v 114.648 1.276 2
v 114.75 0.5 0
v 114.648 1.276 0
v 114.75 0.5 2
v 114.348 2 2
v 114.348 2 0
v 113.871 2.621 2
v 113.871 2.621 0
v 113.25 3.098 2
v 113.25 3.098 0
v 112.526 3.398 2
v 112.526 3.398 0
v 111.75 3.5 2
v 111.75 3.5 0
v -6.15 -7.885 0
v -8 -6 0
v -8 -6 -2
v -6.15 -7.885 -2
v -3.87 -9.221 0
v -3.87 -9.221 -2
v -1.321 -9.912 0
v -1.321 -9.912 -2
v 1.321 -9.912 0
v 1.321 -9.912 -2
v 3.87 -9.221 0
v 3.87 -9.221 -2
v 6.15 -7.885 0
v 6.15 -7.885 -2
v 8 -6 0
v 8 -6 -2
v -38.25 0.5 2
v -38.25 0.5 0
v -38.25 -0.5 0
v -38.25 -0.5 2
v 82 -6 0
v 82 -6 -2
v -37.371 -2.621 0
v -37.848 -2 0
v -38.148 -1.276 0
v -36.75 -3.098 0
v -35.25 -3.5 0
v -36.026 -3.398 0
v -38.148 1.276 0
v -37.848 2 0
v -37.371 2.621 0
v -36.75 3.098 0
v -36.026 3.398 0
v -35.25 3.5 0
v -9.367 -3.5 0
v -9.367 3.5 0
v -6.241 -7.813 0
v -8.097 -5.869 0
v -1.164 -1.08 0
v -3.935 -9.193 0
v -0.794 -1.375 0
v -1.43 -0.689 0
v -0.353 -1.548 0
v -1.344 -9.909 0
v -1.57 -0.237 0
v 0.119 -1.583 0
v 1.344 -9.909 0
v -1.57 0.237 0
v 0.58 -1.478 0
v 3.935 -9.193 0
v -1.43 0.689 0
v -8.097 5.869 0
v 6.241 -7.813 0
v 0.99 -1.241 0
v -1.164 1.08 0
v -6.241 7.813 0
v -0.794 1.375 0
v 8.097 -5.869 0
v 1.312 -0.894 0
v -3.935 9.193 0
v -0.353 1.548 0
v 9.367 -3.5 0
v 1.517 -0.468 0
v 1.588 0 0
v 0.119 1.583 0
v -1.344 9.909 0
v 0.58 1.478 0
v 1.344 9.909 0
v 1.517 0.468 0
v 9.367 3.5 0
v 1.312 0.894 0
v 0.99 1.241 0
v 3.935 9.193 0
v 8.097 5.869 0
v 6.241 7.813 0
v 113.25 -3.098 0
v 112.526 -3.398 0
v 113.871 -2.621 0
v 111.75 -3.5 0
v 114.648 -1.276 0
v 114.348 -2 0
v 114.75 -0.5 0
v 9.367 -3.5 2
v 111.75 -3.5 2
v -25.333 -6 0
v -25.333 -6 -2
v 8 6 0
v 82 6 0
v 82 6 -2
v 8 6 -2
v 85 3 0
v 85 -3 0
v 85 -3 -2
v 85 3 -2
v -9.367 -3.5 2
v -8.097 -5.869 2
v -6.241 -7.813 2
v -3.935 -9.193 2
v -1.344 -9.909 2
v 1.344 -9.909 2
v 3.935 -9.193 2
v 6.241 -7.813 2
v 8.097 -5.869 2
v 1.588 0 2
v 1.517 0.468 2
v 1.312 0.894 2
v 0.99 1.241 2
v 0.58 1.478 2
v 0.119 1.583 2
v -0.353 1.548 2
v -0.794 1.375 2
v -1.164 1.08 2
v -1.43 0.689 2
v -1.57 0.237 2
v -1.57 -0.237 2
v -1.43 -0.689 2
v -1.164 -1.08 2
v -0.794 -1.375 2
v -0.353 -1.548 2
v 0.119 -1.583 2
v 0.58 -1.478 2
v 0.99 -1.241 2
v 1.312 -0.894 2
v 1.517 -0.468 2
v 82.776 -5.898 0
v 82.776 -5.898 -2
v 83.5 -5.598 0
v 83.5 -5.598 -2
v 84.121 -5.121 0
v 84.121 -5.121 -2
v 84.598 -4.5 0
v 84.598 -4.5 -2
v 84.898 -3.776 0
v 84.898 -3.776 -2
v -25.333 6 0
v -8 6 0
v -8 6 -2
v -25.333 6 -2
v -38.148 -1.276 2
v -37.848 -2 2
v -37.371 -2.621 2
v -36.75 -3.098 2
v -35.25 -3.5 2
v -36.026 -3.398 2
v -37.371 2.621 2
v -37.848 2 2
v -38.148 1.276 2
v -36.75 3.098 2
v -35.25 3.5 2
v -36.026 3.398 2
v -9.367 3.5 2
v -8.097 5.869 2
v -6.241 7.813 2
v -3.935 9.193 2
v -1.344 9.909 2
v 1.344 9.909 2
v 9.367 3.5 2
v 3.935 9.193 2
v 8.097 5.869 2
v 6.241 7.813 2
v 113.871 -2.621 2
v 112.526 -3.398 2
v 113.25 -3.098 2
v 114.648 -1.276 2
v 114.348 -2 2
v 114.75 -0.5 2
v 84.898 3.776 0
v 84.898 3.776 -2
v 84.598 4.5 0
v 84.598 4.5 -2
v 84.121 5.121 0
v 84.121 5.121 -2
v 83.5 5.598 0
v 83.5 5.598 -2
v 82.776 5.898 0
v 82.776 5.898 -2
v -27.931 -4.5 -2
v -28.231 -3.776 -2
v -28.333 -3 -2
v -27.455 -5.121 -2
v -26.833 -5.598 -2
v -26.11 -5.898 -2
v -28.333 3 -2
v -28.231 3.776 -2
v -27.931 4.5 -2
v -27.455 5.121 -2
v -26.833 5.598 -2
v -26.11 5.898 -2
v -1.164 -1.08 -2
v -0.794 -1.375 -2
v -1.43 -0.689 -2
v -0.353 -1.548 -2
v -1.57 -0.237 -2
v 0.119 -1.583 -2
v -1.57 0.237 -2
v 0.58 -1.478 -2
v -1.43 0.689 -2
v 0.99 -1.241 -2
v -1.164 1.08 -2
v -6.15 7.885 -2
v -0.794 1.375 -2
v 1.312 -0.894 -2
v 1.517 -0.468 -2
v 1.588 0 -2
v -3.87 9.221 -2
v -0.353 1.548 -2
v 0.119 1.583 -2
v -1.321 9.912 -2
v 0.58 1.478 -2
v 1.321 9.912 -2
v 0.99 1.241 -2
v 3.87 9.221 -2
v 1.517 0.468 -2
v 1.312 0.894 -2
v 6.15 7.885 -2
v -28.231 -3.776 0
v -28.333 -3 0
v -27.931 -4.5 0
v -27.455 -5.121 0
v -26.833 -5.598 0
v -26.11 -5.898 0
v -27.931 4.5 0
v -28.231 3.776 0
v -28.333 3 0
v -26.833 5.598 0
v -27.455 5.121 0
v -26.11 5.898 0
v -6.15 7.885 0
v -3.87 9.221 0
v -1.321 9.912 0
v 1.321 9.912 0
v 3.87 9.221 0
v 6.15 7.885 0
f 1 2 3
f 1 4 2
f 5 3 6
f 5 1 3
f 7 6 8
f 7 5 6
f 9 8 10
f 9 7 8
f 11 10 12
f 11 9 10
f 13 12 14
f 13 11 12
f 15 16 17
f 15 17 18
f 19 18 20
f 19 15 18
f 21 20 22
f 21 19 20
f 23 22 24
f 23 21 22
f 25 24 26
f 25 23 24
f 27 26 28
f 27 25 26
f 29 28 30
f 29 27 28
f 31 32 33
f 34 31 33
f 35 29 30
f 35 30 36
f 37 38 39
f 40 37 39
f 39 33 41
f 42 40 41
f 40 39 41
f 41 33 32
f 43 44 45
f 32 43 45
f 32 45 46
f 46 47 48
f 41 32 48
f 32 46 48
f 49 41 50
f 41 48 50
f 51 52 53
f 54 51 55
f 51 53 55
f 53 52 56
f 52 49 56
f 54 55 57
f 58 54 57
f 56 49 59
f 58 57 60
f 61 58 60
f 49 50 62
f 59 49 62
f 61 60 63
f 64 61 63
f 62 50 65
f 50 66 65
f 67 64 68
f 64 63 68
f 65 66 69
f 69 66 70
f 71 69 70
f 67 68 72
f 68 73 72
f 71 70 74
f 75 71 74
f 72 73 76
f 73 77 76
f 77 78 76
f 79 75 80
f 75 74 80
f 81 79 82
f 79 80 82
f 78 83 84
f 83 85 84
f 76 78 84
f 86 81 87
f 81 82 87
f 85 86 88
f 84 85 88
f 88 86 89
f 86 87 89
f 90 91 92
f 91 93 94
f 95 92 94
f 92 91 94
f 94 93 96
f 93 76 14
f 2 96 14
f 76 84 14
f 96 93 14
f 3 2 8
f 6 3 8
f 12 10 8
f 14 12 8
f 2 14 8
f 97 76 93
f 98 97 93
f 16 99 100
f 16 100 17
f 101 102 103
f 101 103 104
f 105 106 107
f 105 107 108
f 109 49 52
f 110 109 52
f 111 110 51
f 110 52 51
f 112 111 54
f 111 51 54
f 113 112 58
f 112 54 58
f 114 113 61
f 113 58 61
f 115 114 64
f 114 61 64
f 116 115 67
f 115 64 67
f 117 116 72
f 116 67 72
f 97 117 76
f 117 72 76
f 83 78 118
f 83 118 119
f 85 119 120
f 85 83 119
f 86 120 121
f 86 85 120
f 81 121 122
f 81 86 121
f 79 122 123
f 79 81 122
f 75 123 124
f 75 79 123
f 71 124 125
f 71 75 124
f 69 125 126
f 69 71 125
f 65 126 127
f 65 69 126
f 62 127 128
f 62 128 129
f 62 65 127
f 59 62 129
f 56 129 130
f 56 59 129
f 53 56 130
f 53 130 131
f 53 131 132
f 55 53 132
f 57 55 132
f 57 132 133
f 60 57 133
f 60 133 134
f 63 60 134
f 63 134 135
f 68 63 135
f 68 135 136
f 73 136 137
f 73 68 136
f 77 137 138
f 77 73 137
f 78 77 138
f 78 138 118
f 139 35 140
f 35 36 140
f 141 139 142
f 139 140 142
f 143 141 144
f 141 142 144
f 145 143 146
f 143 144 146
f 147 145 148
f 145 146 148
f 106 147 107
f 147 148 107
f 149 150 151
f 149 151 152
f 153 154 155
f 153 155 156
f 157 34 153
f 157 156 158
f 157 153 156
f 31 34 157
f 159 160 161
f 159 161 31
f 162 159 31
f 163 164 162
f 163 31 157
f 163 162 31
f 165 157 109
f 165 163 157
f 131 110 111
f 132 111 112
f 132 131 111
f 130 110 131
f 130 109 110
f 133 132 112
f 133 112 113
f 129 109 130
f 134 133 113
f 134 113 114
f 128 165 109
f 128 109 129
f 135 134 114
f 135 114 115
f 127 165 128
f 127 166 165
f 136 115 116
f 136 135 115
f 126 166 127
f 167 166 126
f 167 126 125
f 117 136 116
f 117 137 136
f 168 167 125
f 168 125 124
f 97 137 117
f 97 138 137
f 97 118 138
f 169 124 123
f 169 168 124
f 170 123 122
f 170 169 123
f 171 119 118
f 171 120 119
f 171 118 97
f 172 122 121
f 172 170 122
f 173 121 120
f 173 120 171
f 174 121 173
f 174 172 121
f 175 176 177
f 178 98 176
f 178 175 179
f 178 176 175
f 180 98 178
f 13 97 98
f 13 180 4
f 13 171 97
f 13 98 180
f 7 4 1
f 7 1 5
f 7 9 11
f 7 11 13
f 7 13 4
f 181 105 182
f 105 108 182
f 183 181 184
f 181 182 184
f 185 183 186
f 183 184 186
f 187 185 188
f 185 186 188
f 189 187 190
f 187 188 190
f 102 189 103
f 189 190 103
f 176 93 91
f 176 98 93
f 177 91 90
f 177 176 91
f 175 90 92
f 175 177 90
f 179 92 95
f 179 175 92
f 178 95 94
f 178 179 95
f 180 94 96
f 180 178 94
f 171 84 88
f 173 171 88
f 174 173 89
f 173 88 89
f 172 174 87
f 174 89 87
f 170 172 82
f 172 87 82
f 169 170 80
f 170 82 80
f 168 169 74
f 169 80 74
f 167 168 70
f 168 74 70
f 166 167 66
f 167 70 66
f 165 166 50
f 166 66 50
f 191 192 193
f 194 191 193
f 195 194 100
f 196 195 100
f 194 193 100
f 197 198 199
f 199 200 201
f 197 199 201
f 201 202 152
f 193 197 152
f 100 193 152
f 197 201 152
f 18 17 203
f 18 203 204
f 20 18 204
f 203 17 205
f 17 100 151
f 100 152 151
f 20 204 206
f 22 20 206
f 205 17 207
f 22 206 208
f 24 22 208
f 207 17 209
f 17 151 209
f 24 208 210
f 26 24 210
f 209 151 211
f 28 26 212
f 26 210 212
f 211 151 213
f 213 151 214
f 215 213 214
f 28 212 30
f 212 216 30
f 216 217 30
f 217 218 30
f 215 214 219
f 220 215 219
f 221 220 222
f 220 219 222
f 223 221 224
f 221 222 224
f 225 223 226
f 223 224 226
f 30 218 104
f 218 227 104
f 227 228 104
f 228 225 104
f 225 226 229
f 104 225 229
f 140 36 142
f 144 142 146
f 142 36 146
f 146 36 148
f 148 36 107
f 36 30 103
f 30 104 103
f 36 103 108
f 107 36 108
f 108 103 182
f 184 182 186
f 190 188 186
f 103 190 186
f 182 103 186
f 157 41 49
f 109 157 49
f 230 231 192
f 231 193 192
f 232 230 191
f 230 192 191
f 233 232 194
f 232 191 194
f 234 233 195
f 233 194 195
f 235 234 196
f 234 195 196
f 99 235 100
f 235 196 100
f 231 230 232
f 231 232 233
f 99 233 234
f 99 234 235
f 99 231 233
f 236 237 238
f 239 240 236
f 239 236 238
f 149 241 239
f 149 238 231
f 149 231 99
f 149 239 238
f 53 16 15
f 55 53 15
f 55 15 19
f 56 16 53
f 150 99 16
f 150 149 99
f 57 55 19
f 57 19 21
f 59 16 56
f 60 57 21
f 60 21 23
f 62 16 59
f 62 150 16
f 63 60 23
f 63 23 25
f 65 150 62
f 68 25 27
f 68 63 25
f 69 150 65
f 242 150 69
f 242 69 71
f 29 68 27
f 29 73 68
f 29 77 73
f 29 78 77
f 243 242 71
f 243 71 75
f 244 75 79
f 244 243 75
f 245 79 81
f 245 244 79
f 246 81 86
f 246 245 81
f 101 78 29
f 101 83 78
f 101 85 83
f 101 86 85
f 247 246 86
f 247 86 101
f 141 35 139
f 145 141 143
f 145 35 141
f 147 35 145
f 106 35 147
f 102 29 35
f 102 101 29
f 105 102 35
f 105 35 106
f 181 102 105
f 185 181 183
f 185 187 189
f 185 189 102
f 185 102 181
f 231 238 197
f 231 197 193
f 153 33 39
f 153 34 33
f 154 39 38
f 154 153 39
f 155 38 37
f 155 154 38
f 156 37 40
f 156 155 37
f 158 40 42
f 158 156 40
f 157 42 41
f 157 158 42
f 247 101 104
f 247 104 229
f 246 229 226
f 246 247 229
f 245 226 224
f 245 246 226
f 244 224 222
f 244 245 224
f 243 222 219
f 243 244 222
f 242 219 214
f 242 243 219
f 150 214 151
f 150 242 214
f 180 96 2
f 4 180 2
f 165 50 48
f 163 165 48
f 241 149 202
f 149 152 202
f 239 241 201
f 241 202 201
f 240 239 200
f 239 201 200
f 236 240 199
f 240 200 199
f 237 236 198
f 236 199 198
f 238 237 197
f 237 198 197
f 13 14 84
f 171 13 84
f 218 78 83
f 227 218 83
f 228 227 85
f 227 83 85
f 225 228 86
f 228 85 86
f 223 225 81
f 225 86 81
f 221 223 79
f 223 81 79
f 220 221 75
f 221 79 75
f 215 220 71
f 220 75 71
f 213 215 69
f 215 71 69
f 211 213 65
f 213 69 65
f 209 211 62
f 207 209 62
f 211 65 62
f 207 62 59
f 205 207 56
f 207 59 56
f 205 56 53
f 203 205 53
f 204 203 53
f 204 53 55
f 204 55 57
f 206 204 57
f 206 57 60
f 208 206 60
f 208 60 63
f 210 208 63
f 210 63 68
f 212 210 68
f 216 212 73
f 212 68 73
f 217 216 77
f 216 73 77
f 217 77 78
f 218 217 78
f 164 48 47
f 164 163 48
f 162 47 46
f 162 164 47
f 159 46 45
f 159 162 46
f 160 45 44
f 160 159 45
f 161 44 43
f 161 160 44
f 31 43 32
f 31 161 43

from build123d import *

# Parameters (mm, degrees)
F0_R     = 1.5875
F1_DEPTH = 2
F2_R     = 1.5875
F3_DEPTH = 2
F4_R     = 3
F4_2_R   = 3


with BuildPart() as f1:
    # F0 (on Top) → F1 (new body)
    with BuildSketch(Plane.XY):
        with BuildLine():
            Line((-9.3674969976, 3.5), (-38.25, 3.5))
            Line((-38.25, 3.5), (-38.25, -3.5))
            Line((-38.25, -3.5), (-9.3674969976, -3.5))
            ThreePointArc((-9.3674969976, -3.5), (-10, 0), (-9.3674969976, 3.5))
        make_face()
        with BuildLine():
            ThreePointArc((9.3674969976, 3.5), (0, 10), (-9.3674969976, 3.5))
            Line((-9.3674969976, 3.5), (9.3674969976, 3.5))
        make_face()
        with BuildLine():
            Line((9.3674969976, 3.5), (-9.3674969976, 3.5))
            ThreePointArc((-9.3674969976, 3.5), (-10, 0), (-9.3674969976, -3.5))
            Line((-9.3674969976, -3.5), (9.3674969976, -3.5))
            ThreePointArc((9.3674969976, -3.5), (9.8406038935, -1.7783461452), (10, 0))
            ThreePointArc((10, 0), (9.8406038935, 1.7783461452), (9.3674969976, 3.5))
        make_face()
        Circle(F0_R, mode=Mode.SUBTRACT)
        with BuildLine():
            Line((114.75, 3.5), (9.3674969976, 3.5))
            ThreePointArc((9.3674969976, 3.5), (9.8406038935, 1.7783461452), (10, 0))
            ThreePointArc((10, 0), (9.8406038935, -1.7783461452), (9.3674969976, -3.5))
            Line((9.3674969976, -3.5), (114.75, -3.5))
            Line((114.75, -3.5), (114.75, 3.5))
        make_face()
        with BuildLine():
            Line((9.3674969976, -3.5), (-9.3674969976, -3.5))
            ThreePointArc((-9.3674969976, -3.5), (0, -10), (9.3674969976, -3.5))
        make_face()
    extrude(amount=F1_DEPTH)

    # F4
    f4_edges = [f1.edges().sort_by_distance(p)[0] for p in [
        (-38.25, 3.5, 1),
        (-38.25, -3.5, 1),
        (114.75, -3.5, 1),
        (114.75, 3.5, 1),
    ]]
    fillet(f4_edges, radius=F4_R)


with BuildPart() as f3:
    # F2 (on Top) → F3 (new body)
    with BuildSketch(Plane.XY):
        with BuildLine():
            Line((-8, 6), (-28.3333333333, 6))
            Line((-28.3333333333, 6), (-28.3333333333, -6))
            Line((-28.3333333333, -6), (-8, -6))
            ThreePointArc((-8, -6), (-10, 0), (-8, 6))
        make_face()
        with BuildLine():
            ThreePointArc((8, 6), (0, 10), (-8, 6))
            Line((-8, 6), (8, 6))
        make_face()
        with BuildLine():
            Line((8, 6), (-8, 6))
            ThreePointArc((-8, 6), (-10, 0), (-8, -6))
            Line((-8, -6), (8, -6))
            ThreePointArc((8, -6), (9.4868329805, -3.1622776602), (10, 0))
            ThreePointArc((10, 0), (9.4868329805, 3.1622776602), (8, 6))
        make_face()
        Circle(F2_R, mode=Mode.SUBTRACT)
        with BuildLine():
            Line((85, 6), (8, 6))
            ThreePointArc((8, 6), (9.4868329805, 3.1622776602), (10, 0))
            ThreePointArc((10, 0), (9.4868329805, -3.1622776602), (8, -6))
            Line((8, -6), (85, -6))
            Line((85, -6), (85, 6))
        make_face()
        with BuildLine():
            Line((8, -6), (-8, -6))
            ThreePointArc((-8, -6), (0, -10), (8, -6))
        make_face()
    extrude(amount=-F3_DEPTH)

    # F4#2
    f4_2_edges = [f3.edges().sort_by_distance(p)[0] for p in [
        (-28.333333, 6, -1),
        (-28.333333, -6, -1),
        (85, -6, -1),
        (85, 6, -1),
    ]]
    fillet(f4_2_edges, radius=F4_2_R)


solid = Compound([f1.part, f3.part])
